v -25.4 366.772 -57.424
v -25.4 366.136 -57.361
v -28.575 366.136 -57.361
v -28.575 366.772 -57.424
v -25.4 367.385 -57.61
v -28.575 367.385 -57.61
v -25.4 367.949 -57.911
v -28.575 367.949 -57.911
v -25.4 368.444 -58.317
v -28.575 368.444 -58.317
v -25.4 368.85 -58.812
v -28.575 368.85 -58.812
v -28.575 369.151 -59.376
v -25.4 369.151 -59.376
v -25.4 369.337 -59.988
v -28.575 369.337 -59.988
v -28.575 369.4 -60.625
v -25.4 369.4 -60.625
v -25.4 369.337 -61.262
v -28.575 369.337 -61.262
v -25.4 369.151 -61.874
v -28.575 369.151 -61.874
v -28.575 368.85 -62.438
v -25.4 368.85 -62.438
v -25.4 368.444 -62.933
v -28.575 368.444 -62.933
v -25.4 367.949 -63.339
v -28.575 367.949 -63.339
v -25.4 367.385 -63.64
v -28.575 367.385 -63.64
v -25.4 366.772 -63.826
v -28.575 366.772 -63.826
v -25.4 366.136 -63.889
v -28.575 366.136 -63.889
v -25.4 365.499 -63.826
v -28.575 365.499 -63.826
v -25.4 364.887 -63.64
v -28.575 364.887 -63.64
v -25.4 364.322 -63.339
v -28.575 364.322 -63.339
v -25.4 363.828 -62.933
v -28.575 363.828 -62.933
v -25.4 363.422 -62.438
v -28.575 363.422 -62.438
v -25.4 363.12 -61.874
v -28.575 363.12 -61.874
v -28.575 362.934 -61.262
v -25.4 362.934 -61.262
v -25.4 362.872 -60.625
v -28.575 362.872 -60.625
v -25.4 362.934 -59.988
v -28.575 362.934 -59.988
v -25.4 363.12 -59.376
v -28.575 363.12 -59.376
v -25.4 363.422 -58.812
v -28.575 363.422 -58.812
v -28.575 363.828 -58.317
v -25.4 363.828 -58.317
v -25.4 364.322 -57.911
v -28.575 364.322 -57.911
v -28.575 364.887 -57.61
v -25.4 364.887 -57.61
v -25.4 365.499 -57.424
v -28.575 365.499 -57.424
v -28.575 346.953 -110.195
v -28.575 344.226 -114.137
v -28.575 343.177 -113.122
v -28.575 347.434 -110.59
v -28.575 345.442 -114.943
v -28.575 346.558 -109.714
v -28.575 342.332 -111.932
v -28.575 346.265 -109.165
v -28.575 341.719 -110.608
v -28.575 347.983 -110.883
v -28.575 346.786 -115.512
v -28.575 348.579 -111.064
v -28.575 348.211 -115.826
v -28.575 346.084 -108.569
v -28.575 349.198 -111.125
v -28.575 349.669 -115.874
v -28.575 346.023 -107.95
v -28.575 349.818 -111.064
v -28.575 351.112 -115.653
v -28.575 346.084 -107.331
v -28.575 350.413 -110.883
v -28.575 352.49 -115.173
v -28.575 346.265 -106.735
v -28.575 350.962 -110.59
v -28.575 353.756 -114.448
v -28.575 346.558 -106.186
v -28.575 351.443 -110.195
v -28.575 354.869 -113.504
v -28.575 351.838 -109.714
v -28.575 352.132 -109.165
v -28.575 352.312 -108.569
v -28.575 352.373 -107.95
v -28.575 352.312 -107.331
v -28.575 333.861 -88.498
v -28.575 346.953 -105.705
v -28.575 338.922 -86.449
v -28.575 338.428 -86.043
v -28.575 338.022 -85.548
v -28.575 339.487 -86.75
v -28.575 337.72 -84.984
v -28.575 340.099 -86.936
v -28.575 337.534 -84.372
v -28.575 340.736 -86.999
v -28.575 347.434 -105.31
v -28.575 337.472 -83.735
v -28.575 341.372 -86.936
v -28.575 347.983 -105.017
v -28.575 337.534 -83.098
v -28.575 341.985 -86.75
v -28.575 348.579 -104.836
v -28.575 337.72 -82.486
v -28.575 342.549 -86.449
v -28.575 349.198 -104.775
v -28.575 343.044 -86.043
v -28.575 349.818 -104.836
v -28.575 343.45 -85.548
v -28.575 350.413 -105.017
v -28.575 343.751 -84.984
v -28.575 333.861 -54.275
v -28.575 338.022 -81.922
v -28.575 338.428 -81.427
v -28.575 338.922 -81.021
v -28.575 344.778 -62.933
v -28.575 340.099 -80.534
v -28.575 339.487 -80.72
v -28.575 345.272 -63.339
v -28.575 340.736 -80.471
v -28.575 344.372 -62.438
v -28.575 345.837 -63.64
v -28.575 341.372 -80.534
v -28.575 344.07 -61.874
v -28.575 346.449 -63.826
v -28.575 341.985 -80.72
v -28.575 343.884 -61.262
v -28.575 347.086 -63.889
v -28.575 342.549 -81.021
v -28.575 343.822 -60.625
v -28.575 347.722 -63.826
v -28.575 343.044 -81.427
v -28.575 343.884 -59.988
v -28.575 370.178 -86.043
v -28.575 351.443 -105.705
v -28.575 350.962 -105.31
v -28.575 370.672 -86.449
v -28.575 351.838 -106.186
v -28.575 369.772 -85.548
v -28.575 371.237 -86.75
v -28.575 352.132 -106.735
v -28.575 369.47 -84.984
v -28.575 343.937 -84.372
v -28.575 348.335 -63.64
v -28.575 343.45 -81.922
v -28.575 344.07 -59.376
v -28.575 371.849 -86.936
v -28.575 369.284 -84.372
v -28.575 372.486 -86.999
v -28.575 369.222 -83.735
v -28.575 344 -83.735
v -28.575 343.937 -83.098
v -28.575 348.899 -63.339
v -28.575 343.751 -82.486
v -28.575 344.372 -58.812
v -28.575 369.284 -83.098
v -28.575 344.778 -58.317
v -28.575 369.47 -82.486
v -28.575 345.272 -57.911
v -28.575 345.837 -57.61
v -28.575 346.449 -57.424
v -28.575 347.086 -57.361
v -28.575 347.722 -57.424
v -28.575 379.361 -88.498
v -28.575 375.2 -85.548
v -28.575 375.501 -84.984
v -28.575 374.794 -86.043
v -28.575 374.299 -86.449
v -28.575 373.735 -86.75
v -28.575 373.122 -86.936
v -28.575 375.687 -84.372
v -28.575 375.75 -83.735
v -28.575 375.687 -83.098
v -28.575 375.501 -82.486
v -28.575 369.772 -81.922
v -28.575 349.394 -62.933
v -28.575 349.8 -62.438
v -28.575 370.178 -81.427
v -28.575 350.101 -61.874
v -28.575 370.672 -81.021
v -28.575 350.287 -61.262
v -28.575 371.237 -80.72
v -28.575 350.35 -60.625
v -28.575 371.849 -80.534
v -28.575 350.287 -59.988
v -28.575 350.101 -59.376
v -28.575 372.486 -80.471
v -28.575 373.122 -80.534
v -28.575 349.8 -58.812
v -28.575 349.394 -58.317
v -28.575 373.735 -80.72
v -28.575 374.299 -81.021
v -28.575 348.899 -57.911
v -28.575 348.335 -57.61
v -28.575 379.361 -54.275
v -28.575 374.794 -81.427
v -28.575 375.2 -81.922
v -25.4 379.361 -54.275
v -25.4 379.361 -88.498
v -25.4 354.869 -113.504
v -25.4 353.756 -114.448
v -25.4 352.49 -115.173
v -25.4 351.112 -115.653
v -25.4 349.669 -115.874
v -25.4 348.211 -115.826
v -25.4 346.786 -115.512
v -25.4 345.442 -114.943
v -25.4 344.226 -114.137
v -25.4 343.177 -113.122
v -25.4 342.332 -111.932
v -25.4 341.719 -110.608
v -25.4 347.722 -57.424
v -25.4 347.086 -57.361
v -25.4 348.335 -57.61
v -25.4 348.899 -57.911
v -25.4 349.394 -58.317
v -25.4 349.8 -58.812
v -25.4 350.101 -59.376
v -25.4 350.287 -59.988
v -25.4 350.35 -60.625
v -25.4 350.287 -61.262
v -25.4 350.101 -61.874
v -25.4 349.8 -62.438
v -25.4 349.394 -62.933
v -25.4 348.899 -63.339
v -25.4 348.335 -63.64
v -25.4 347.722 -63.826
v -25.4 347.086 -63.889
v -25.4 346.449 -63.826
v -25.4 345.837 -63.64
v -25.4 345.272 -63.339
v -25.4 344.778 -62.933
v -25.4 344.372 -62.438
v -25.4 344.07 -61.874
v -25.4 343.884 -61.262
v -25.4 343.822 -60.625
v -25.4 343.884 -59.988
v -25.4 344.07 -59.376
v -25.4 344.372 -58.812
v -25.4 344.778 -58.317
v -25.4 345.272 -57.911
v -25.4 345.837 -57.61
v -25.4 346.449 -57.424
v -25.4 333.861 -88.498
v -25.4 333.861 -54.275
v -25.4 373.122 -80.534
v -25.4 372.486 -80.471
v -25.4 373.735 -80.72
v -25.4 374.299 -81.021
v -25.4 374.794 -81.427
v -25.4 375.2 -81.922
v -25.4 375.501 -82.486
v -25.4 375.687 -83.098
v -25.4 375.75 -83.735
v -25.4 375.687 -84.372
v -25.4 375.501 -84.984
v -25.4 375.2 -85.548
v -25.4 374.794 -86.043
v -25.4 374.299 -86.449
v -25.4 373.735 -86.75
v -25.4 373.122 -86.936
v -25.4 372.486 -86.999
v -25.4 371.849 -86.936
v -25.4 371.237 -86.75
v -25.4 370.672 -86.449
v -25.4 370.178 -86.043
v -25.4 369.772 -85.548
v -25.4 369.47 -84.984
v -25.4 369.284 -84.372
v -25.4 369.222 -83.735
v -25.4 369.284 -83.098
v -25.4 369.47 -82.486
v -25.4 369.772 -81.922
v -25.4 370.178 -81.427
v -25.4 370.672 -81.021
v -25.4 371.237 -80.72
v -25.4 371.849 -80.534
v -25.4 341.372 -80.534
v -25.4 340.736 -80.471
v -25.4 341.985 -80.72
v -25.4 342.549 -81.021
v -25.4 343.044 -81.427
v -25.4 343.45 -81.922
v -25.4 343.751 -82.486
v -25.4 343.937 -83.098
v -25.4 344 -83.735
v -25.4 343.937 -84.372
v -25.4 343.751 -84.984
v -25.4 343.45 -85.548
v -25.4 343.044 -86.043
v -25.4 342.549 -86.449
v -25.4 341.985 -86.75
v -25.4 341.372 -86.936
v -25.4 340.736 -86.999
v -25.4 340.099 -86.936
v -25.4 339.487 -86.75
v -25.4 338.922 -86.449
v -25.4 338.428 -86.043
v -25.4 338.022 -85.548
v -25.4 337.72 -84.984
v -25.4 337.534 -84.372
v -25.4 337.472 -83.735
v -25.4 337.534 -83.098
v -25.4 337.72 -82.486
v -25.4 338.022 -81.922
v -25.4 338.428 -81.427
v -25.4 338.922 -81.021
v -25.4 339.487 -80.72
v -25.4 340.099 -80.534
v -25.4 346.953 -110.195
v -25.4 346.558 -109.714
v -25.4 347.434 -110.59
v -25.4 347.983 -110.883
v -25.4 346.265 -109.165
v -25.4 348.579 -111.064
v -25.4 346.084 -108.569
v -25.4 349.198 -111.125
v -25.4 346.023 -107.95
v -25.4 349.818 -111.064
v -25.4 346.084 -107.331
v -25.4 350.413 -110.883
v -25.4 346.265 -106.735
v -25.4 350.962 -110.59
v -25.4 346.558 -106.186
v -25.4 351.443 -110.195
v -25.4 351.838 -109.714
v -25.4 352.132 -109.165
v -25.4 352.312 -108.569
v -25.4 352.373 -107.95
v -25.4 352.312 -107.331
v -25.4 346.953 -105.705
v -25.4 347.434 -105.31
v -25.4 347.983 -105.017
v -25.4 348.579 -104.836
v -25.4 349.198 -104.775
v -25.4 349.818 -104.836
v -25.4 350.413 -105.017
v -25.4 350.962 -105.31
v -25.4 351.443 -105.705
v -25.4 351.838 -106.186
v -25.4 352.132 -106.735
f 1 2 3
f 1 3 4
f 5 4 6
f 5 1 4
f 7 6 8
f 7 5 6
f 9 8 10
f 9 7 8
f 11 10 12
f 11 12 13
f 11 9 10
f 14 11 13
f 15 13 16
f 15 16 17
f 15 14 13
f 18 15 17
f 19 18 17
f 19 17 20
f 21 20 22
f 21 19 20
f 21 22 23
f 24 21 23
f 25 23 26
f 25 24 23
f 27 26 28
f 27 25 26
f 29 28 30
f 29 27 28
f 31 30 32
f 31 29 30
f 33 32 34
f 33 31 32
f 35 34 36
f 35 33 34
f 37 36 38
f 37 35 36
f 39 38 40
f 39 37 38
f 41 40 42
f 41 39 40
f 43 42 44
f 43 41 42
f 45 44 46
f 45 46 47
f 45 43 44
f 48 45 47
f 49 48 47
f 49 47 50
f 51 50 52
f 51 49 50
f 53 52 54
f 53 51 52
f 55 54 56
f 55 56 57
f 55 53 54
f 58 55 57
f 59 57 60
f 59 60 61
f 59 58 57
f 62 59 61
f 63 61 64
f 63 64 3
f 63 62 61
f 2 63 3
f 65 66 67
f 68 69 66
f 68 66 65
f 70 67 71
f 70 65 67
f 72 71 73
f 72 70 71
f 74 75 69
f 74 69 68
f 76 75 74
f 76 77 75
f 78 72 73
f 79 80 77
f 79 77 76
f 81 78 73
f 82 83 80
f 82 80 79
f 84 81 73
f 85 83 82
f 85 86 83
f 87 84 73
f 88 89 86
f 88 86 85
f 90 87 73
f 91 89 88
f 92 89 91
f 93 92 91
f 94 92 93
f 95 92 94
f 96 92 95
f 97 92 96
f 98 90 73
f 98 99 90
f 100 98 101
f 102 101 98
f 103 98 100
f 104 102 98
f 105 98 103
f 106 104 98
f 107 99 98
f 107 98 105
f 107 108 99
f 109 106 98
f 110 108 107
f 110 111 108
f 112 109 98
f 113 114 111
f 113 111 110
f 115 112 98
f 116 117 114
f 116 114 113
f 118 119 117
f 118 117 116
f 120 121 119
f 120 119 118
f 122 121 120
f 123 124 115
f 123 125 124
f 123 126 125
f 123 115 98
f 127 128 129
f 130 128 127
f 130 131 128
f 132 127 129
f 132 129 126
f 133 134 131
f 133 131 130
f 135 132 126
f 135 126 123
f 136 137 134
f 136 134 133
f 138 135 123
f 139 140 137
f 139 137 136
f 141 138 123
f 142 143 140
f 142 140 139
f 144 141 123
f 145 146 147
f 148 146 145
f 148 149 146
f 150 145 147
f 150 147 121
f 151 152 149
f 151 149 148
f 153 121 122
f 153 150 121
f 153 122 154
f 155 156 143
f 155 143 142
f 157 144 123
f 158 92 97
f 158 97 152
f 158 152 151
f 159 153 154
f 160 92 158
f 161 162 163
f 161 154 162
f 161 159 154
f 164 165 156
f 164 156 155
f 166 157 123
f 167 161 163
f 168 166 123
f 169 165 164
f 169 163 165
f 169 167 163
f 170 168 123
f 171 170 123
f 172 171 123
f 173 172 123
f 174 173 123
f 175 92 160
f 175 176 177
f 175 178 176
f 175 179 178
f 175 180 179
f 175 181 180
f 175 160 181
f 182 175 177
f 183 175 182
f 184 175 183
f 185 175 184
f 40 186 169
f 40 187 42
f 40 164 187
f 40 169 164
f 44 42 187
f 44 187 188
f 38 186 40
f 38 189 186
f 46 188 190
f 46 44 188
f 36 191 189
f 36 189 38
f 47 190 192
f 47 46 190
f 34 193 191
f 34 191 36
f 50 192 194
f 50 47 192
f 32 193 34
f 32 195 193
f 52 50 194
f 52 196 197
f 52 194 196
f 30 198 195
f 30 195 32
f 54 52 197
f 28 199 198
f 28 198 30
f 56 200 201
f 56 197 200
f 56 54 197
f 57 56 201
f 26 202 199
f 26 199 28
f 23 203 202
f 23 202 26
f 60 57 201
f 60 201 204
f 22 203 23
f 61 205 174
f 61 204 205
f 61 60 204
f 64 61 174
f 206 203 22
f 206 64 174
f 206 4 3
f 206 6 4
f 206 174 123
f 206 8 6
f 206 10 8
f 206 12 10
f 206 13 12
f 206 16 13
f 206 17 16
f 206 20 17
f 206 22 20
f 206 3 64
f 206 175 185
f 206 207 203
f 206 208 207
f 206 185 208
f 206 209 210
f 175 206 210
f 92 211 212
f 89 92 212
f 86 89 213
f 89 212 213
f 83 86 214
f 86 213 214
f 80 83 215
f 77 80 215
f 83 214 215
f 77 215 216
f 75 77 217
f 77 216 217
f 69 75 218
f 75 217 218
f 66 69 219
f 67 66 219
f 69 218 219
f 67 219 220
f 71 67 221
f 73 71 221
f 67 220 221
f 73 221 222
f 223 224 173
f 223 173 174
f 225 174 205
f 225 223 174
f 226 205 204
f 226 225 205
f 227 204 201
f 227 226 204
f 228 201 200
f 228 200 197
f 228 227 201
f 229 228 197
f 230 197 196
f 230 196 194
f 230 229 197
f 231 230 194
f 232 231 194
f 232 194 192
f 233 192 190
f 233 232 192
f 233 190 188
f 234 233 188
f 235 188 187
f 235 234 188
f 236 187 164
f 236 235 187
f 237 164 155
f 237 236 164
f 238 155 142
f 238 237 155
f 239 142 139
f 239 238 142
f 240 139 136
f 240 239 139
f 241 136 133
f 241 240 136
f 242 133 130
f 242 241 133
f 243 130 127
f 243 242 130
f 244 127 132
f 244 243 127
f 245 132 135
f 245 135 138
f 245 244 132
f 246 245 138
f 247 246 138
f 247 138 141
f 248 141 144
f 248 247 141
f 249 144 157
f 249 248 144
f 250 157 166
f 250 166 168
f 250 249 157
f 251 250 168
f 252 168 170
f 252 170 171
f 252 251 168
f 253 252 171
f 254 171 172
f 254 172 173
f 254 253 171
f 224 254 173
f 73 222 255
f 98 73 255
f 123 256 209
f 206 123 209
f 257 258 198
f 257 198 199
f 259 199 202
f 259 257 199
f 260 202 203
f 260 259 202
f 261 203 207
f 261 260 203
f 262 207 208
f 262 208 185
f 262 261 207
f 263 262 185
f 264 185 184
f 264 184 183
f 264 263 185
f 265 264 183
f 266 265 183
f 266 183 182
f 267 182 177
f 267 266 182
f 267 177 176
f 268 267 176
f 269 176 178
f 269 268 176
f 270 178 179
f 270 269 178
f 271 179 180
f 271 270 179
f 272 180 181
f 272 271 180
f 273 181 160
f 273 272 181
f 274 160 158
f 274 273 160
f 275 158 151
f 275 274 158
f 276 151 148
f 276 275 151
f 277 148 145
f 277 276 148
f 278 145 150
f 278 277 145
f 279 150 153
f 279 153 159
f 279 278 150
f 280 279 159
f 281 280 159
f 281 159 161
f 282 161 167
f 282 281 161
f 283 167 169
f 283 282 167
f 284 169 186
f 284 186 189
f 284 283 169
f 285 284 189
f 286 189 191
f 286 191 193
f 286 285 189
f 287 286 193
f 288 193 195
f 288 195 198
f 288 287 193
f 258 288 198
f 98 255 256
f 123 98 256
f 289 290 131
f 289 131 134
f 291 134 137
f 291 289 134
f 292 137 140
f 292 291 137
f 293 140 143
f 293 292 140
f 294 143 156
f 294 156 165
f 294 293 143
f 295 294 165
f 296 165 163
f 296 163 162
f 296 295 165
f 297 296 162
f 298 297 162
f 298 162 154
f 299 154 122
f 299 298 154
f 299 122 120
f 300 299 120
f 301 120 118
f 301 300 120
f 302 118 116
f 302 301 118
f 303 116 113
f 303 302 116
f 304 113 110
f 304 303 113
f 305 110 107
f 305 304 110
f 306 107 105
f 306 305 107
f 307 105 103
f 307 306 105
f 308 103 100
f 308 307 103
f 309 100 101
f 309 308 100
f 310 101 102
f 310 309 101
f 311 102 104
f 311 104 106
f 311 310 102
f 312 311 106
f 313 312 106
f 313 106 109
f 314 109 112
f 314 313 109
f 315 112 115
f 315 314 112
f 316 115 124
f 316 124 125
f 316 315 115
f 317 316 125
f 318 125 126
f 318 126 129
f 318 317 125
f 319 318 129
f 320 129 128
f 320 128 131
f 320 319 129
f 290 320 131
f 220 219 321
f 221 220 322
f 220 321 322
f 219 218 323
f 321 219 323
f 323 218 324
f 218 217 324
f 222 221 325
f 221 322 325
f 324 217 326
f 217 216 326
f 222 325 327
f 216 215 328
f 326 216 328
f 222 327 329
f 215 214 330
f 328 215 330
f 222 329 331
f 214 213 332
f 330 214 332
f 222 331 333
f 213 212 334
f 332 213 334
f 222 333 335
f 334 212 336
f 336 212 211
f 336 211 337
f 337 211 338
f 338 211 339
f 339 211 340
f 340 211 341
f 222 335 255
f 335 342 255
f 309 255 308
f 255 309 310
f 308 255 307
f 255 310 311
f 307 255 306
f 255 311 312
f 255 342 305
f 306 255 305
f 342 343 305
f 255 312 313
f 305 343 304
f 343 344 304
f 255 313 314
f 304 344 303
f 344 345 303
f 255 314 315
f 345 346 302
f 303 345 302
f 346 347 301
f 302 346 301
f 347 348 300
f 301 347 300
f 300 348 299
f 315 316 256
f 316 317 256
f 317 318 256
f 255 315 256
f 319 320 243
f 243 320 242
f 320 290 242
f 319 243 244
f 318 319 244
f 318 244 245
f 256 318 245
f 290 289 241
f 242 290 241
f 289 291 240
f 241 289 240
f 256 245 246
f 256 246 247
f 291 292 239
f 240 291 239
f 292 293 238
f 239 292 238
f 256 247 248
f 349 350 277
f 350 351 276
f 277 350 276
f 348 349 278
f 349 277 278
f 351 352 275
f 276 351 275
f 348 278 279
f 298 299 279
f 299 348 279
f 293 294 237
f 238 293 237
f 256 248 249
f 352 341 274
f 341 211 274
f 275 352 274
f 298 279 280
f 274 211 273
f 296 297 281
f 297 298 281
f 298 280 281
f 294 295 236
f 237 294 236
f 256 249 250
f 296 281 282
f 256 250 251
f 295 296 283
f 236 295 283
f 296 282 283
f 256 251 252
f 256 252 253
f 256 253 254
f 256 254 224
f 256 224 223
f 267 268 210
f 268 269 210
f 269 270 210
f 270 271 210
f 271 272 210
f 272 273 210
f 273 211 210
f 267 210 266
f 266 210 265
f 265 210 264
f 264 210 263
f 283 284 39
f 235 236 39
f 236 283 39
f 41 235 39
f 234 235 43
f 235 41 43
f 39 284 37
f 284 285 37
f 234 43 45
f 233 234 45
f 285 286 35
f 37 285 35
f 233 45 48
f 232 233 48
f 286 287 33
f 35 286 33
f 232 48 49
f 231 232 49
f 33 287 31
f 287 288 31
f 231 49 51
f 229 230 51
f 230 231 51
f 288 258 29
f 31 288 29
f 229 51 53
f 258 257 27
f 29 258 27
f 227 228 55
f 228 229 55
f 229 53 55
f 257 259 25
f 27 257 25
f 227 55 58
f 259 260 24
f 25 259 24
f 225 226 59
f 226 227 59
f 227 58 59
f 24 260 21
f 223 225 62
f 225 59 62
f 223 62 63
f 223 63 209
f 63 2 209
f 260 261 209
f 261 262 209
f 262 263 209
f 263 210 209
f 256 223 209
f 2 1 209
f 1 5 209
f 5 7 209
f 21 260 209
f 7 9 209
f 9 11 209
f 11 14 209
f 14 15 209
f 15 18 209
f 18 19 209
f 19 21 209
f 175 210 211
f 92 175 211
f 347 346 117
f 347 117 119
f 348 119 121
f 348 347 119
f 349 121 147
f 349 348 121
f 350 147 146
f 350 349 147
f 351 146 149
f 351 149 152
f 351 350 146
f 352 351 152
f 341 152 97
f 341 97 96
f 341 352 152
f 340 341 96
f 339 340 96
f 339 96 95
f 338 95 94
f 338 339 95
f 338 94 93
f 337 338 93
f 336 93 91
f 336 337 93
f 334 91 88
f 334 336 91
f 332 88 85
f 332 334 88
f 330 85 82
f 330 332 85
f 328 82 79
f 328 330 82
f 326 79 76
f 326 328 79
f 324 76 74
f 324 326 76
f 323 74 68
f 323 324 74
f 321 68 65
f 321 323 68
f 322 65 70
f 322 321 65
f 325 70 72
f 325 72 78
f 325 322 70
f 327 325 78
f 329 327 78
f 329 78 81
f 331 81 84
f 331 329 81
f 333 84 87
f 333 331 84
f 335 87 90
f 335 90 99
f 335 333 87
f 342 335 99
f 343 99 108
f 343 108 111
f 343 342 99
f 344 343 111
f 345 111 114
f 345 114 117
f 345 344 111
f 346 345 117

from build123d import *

# Parameters (mm, degrees)
SKETCH1_R           = 3.175
SKETCH1_R_2         = 3.2639
SKETCH1_R_3         = 3.96875
BOSS_EXTRUDE1_DEPTH = 3.175


with BuildPart() as part:
    # Sketch1 → Boss-Extrude1 (new body)
    # profile 1 of 3: a face of its own
    with BuildSketch(Plane.ZY.offset(25.4)):
        with BuildLine():
            Line((-88.4975, 379.360683619), (-113.503995941, 354.868900976))
            ThreePointArc((-113.503995941, 354.868900976), (-115.701762144, 347.491113055), (-110.608164688, 341.71900808))
            Line((-110.608164688, 341.71900808), (-88.4975, 333.860683619))
            Line((-88.4975, 333.860683619), (-102.195874596, 351.845168269))
            ThreePointArc((-102.195874596, 351.845168269), (-103.980307482, 357.263971701), (-102.037425504, 362.628003857))
            Line((-102.037425504, 362.628003857), (-88.4975, 379.360683619))
        make_face()
        with Locations((-107.95, 349.198183619)):
            Circle(SKETCH1_R, mode=Mode.SUBTRACT)
    # profile 2 of 3: a face of its own
    with BuildSketch(Plane.ZY.offset(25.4)):
        with BuildLine():
            Line((-54.275, 333.860683619), (-54.275, 379.360683619))
            Line((-54.275, 379.360683619), (-88.4975, 379.360683619))
            Line((-88.4975, 379.360683619), (-102.037425504, 362.628003857))
            ThreePointArc((-102.037425504, 362.628003857), (-103.980307482, 357.263971701), (-102.195874596, 351.845168269))
            Line((-102.195874596, 351.845168269), (-88.4975, 333.860683619))
            Line((-88.4975, 333.860683619), (-54.275, 333.860683619))
        make_face()
        with Locations((-83.735, 340.735683619)):
            Circle(SKETCH1_R_2, mode=Mode.SUBTRACT)
        with Locations((-95.25, 357.135683619)):
            Circle(SKETCH1_R_3, mode=Mode.SUBTRACT)
        with Locations((-60.625, 366.135683619)):
            Circle(SKETCH1_R_2, mode=Mode.SUBTRACT)
        with Locations((-83.735, 372.485683619)):
            Circle(SKETCH1_R_2, mode=Mode.SUBTRACT)
        with Locations((-60.625, 347.085683619)):
            Circle(SKETCH1_R_2, mode=Mode.SUBTRACT)
    # profile 3 of 3: a face of its own
    with BuildSketch(Plane.ZY.offset(25.4)):
        with Locations((-95.25, 357.135683619)):
            Circle(SKETCH1_R_3)
    extrude(amount=BOSS_EXTRUDE1_DEPTH)


solid = part.part
